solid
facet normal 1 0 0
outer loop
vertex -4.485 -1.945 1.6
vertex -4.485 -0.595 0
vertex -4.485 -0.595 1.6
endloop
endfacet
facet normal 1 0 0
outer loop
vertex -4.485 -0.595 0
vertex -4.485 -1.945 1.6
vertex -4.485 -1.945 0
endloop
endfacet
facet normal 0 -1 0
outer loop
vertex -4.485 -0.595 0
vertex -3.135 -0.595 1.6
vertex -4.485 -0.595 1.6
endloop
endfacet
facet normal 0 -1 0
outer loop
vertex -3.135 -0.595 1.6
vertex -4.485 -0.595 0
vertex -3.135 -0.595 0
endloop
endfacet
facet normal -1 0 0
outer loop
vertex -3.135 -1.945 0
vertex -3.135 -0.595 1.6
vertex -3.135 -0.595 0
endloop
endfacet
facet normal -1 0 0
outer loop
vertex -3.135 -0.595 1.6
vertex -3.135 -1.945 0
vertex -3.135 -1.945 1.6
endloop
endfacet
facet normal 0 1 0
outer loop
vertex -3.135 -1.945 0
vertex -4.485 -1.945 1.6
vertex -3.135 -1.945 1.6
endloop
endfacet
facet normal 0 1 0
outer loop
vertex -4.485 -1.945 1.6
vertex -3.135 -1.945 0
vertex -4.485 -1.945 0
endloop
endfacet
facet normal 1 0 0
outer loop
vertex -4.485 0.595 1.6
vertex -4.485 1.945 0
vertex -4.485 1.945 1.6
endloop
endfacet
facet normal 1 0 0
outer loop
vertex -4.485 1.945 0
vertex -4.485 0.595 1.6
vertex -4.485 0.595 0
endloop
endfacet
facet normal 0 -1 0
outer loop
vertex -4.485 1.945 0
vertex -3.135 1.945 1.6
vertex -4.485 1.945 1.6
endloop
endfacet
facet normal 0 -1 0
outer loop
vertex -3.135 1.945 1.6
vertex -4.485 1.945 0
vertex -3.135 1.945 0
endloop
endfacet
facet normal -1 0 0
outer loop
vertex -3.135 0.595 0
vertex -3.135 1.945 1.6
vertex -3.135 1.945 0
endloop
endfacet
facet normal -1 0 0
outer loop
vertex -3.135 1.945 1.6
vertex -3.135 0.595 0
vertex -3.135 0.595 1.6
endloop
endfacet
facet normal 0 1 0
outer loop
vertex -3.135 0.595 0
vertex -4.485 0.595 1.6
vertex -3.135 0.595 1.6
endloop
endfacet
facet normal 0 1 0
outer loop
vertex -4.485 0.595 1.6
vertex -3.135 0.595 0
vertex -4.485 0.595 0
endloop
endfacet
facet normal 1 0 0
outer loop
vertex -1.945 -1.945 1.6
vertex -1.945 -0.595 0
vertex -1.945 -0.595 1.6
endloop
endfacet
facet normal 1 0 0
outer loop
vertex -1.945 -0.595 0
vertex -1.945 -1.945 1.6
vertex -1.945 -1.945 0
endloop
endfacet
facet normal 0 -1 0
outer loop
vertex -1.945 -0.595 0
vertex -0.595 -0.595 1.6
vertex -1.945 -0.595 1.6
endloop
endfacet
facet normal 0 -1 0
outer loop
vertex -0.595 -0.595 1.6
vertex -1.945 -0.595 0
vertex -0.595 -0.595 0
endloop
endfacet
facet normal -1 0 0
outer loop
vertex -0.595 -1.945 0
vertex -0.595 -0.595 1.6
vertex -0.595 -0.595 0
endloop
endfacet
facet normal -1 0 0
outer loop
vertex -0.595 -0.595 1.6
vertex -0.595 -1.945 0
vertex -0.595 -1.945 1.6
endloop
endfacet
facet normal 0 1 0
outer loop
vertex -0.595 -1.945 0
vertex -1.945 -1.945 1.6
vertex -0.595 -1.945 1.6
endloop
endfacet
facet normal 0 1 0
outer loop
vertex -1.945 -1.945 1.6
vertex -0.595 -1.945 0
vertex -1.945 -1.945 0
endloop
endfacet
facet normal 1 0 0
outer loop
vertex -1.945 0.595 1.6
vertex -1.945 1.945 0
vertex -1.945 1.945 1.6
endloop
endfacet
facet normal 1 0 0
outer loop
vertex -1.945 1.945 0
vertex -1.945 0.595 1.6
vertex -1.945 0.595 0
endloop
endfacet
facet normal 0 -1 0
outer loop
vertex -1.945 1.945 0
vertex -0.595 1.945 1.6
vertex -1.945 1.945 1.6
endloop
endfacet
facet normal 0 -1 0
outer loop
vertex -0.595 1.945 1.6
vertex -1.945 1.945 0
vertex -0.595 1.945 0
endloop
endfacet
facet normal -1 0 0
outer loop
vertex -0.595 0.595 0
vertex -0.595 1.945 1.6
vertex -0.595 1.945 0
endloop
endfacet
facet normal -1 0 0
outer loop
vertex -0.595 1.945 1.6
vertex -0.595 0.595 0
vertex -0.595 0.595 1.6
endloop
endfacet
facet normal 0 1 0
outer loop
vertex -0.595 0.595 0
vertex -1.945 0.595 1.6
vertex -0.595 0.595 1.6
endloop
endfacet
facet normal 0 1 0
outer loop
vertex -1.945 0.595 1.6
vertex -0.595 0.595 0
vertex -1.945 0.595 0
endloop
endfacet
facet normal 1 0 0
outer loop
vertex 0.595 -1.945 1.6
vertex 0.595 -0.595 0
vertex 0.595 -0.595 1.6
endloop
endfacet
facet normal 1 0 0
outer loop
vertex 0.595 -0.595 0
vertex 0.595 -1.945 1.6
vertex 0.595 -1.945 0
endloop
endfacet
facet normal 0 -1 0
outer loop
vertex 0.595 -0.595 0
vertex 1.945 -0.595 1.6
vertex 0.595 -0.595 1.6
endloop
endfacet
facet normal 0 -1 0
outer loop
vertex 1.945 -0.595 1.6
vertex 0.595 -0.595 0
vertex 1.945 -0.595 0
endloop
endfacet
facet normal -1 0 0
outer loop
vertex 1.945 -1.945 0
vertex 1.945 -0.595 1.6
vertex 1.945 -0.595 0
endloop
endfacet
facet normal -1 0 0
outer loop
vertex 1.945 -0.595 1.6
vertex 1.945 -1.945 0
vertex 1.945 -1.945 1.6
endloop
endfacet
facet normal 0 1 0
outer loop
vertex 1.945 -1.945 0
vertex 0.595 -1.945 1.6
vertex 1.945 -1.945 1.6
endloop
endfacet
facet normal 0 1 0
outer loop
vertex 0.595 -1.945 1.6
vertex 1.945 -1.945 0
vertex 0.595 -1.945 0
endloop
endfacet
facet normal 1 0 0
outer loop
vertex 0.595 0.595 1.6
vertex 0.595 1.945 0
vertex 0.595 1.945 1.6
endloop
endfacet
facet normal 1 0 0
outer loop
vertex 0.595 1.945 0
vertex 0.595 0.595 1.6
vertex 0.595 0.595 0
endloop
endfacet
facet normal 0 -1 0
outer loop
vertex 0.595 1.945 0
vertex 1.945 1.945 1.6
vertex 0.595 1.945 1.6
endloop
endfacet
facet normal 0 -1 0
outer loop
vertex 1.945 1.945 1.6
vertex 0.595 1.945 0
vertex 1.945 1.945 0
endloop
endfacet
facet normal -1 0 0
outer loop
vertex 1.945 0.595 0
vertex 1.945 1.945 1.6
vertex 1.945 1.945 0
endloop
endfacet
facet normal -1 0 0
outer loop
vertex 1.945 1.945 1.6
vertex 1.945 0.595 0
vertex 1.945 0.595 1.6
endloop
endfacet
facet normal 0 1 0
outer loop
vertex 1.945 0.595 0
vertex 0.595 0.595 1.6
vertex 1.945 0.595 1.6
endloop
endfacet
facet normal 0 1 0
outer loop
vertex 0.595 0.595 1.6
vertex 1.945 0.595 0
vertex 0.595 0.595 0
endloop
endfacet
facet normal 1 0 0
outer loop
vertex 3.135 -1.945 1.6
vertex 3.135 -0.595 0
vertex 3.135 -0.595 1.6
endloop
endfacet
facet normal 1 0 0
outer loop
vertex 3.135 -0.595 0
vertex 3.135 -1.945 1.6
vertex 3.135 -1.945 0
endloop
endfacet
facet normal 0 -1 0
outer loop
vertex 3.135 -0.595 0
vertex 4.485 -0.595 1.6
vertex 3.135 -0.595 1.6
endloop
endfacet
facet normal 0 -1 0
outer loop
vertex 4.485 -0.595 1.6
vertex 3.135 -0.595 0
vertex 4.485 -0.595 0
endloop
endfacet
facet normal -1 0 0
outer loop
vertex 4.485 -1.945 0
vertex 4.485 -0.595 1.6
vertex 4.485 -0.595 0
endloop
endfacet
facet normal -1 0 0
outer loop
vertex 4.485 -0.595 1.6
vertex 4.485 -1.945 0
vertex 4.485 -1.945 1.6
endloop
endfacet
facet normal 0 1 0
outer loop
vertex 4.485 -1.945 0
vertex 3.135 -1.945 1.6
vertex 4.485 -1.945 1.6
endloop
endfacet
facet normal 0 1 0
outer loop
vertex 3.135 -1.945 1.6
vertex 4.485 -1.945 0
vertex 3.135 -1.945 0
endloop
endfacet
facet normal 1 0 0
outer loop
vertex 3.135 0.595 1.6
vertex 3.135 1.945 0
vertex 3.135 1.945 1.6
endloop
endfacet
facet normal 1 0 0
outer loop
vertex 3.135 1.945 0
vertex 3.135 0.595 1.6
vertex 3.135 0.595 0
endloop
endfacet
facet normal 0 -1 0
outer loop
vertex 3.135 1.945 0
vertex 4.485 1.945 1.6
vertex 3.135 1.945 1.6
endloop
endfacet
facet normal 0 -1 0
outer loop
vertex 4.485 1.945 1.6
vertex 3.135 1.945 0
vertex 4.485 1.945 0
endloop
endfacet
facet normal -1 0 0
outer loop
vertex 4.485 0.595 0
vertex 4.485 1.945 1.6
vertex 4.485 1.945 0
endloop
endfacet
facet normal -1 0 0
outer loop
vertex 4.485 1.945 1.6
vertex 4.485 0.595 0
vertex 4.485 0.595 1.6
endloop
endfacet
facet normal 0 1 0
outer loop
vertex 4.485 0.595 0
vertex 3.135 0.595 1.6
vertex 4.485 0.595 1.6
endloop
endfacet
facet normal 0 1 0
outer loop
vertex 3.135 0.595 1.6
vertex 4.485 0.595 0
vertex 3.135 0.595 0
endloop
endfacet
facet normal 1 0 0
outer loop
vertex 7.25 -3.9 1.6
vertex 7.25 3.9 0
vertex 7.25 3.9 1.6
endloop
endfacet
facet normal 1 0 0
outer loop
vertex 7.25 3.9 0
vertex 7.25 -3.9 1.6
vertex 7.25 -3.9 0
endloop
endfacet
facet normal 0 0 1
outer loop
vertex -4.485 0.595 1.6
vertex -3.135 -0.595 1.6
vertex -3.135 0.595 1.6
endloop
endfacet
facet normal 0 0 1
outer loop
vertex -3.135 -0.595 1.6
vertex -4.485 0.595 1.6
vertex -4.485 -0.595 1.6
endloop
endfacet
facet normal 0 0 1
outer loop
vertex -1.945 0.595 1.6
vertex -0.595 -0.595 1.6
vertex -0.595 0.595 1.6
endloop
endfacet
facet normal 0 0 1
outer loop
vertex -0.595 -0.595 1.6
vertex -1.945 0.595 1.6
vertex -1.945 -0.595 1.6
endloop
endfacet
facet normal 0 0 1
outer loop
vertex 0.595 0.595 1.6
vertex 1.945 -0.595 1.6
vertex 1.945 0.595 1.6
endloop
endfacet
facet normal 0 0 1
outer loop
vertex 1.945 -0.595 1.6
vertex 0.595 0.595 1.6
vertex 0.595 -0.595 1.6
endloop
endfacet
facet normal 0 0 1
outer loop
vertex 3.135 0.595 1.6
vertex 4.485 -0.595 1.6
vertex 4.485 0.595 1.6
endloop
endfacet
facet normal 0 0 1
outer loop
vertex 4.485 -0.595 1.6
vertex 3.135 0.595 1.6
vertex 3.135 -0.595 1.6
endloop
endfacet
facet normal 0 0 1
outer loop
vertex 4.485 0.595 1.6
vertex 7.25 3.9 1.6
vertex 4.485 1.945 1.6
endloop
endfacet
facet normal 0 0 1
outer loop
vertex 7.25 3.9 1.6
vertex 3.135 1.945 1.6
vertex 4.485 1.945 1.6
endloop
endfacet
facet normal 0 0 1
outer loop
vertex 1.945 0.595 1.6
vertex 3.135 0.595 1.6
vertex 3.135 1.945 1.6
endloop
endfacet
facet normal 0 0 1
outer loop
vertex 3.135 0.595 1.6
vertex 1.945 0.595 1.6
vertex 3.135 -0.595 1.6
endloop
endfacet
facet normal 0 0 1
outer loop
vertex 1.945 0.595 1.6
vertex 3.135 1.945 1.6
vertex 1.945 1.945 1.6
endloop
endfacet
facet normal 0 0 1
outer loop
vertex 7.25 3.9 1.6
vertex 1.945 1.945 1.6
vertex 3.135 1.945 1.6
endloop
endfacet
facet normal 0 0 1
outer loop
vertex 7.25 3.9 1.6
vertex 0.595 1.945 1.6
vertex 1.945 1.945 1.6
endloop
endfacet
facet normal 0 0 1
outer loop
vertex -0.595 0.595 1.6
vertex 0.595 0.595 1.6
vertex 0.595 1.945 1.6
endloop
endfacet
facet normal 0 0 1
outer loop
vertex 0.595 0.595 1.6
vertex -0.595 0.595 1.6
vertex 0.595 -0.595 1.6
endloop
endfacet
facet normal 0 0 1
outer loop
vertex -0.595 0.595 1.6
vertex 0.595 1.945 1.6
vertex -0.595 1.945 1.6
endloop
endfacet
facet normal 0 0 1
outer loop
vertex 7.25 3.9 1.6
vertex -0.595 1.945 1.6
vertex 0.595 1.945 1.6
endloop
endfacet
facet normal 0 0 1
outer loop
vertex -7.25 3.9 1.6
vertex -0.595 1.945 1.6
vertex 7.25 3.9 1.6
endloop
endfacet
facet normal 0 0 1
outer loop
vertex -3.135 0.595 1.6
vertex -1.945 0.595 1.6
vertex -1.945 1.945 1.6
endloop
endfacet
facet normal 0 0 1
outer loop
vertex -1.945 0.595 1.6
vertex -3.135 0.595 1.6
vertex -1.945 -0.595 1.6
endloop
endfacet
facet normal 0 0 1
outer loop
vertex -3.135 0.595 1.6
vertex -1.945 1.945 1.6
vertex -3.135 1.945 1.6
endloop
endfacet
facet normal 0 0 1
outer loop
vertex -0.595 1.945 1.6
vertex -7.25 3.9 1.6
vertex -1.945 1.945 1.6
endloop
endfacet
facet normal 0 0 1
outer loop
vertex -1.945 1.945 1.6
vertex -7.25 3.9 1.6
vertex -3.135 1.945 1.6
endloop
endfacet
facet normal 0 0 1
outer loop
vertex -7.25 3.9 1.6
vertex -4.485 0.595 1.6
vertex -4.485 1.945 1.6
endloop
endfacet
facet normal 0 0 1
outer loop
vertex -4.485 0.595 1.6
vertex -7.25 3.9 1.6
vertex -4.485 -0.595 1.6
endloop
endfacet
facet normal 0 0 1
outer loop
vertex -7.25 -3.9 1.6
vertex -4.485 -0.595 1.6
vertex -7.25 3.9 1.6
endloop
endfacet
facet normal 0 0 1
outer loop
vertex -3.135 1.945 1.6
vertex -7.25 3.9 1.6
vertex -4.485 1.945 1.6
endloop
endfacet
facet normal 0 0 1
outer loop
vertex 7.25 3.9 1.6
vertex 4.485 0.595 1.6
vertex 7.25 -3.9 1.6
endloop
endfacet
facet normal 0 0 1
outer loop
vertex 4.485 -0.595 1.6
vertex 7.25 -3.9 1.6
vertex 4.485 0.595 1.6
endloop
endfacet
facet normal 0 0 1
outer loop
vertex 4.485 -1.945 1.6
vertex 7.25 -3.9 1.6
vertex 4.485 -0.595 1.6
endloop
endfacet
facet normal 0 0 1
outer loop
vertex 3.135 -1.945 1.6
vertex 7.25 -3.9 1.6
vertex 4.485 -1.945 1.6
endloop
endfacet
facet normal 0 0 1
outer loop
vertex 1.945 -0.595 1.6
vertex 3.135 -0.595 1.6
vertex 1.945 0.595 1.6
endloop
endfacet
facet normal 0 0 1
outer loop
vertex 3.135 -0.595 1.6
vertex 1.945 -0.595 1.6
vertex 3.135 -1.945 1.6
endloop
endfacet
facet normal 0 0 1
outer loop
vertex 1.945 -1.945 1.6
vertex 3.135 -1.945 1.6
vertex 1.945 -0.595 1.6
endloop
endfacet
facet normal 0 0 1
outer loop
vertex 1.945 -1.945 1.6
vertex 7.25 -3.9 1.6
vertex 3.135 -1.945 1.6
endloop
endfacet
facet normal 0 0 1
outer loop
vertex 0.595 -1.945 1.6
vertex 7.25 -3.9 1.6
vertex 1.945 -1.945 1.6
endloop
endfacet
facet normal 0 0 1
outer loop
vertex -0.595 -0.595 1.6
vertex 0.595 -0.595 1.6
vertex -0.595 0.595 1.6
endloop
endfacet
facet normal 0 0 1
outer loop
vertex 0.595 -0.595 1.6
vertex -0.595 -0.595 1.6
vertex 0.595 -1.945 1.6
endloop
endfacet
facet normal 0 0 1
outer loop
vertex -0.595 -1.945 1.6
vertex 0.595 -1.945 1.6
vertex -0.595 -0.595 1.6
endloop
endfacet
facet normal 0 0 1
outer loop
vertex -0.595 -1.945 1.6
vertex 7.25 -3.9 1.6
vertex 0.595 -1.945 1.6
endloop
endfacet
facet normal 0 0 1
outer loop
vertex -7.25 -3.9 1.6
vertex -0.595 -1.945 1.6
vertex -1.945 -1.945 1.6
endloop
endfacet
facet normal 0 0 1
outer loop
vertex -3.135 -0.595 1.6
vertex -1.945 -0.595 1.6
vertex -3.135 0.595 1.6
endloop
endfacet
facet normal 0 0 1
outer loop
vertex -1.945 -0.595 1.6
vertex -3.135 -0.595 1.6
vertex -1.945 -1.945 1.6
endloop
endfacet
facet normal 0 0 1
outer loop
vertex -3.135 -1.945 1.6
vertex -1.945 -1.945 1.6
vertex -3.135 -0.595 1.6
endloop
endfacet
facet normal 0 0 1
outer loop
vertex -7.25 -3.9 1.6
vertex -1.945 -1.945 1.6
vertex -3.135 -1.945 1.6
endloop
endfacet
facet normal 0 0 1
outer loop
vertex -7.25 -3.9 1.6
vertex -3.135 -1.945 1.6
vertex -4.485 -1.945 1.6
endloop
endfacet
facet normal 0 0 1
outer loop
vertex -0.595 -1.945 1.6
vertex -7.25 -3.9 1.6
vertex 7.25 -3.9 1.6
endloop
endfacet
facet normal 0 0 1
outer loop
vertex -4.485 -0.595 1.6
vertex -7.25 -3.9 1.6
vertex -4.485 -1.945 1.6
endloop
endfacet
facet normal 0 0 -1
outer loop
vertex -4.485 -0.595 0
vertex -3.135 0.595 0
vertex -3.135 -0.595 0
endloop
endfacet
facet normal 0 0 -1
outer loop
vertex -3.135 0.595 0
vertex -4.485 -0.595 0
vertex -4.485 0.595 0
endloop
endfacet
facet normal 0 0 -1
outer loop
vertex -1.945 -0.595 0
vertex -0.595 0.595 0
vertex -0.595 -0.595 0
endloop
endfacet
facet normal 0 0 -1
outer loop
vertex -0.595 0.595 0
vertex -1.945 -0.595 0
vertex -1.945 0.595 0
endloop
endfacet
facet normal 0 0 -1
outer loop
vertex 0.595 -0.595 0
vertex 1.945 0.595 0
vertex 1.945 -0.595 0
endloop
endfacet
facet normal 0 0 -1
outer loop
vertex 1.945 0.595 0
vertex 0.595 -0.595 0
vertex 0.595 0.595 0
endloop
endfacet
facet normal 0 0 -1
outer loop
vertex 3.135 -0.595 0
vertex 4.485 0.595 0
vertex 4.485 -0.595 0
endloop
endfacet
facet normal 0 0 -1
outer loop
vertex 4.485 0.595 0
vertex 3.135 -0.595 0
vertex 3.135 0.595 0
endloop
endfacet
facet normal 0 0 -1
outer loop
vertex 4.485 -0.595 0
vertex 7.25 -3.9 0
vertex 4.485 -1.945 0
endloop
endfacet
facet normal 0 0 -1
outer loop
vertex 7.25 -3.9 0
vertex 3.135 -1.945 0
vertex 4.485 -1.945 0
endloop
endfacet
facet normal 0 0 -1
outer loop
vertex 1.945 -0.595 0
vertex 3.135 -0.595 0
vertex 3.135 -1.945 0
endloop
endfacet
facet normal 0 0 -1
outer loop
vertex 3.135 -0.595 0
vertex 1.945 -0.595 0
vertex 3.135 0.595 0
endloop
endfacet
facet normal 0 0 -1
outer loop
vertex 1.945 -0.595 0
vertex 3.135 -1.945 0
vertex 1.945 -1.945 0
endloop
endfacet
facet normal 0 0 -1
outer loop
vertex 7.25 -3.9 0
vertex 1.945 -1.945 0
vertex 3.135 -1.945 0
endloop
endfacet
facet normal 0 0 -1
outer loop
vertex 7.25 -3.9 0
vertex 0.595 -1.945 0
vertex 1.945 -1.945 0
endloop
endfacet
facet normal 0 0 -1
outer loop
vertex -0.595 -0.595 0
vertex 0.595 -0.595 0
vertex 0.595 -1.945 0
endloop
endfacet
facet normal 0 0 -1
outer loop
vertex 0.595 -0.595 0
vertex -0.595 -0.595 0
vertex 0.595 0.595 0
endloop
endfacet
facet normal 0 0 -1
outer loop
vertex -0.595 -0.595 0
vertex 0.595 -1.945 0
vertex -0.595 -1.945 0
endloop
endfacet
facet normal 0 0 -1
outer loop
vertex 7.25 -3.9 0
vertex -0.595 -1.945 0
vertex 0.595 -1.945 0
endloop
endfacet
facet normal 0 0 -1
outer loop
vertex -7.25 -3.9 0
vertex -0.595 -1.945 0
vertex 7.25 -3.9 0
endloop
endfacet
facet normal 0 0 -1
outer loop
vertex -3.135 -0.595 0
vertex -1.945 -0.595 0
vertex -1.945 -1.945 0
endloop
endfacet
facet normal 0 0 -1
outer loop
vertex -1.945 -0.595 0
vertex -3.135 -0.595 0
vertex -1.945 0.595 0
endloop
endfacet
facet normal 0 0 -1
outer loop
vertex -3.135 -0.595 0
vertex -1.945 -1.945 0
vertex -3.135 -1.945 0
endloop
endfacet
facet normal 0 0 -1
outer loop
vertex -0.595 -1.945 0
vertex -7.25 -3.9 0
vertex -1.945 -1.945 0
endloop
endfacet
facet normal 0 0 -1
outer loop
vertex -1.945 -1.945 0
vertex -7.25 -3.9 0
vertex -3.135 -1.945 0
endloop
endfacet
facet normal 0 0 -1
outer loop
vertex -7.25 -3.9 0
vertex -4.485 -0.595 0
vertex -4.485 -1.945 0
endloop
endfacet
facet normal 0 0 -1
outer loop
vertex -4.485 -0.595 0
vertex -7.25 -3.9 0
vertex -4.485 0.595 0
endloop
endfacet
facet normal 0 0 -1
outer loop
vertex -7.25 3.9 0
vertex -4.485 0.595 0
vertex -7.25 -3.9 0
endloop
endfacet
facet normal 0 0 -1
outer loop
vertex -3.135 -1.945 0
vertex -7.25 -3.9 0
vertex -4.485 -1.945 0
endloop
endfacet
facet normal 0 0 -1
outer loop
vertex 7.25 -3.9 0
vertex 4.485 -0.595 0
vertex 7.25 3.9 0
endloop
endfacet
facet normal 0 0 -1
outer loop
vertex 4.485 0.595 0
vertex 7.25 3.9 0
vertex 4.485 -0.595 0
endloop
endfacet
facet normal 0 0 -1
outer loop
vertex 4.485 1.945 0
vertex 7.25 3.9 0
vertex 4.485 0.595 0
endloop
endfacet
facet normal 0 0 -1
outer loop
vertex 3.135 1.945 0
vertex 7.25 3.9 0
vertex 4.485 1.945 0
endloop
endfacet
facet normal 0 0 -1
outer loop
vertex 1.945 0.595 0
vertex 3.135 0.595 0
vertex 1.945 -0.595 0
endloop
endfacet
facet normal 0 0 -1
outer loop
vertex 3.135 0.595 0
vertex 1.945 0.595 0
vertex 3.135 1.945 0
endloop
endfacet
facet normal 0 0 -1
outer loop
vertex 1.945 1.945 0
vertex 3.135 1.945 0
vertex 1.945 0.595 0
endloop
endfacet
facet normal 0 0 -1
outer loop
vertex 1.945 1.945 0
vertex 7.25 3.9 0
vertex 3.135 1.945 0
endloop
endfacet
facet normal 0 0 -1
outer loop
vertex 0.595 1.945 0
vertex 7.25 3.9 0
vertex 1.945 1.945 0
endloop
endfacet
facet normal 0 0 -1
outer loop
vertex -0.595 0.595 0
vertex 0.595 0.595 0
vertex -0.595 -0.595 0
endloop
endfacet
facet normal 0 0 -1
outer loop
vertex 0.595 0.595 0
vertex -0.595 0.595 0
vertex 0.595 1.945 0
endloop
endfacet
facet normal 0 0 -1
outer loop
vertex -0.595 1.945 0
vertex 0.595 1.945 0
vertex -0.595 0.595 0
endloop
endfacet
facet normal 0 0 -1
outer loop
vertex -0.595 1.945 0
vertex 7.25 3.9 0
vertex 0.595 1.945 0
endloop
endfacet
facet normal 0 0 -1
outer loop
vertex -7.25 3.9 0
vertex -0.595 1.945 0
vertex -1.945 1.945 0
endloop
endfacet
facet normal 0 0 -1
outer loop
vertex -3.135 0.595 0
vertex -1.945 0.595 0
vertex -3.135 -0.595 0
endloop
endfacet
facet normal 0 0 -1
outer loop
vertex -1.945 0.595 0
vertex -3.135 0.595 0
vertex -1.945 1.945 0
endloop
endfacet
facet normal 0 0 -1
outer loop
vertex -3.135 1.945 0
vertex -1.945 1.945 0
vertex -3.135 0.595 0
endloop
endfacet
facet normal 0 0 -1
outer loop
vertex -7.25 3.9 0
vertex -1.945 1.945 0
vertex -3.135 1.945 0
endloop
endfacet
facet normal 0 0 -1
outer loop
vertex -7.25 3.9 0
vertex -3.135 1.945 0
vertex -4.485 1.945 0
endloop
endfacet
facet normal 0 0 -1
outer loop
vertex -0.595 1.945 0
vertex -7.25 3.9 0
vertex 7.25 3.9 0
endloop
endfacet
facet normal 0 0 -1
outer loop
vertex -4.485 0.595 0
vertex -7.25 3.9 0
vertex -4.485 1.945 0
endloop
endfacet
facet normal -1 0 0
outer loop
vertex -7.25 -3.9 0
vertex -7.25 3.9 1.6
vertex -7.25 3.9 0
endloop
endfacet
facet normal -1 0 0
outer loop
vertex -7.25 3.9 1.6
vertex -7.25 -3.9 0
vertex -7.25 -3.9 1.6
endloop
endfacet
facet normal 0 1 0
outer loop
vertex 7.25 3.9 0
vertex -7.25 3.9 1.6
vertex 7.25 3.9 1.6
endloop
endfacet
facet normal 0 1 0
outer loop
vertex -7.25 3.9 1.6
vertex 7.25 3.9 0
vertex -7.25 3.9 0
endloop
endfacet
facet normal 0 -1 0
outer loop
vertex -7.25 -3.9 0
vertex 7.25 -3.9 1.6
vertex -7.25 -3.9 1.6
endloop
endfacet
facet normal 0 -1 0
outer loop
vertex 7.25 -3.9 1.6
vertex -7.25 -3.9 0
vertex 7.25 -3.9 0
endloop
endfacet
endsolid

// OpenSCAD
// BTS7960 driver-side holder for six *individual* female Dupont jumper ends.
// Two printed dummies occupy R_IS and L_IS. Mechanical fit prototype only.
// Dimensions are millimetres. Actual 1P jumper plastic must be measured.

$fn = 48;

part = "fit_gauge"; // [fit_gauge,lower,upper,dummy,assembly,exploded]
side_relief = 0.0; // v3 test uses 1.0 mm extra outward space per half

pitch = 2.54;
pin_aperture = 1.35;   // carried over from the driver gauge that fitted
front_lip = 1.60;

// Provisional dimensions for one separate 1P female Dupont plastic end.
single_x = 2.54;
single_y = 2.54;
single_z = 14.00;
pack_clearance = 0.40; // total clearance around a packed 2x4 block
pack_clearance_y = pack_clearance + 2*side_relief;

nose_x = 14.50;         // keep the v1 driver-side x envelope
nose_y = 7.80 + 2*side_relief;
rear_stop = 3.00;       // plastic behind the female ends
nose_z = front_lip + single_z + rear_stop;

rear_x = 25.00;
rear_y = 15.00;
rear_z = 18.00;
rear_corner_r = 2.50;
total_z = nose_z + rear_z;

wire_channel_x = 1.50; // provisional; verify against jumper insulation
wire_channel_y = 2.20; // open at the split so cables can be laid in place
rear_chamber_x = 13.00;
rear_chamber_y = 8.00;
rear_chamber_depth = 12.50;
cable_exit_d = 6.00;

screw_x = 9.00;
screw_z = nose_z + 7.00;
screw_clearance_d = 3.20; // M3 bolts and external nuts as in v1
mark_depth = 0.60;

dummy_x = single_x;
dummy_y = single_y;
dummy_z = single_z;
dummy_pin_hole = 1.45;

epsilon = 0.02;

function contact_x(col) = (col - 1.5)*pitch;
function contact_y(row) = (row - 0.5)*pitch;
// Column 1 in each row is the unused current-sense (IS) contact.
function used(col) = col != 1;

assert(4*single_x + pack_clearance < nose_x);
assert(2*single_y + pack_clearance_y < nose_y);

module eight_pin_pattern(h=front_lip) {
    for (col = [0:3], row = [0:1])
        translate([contact_x(col), contact_y(row), -epsilon])
            linear_extrude(height=h+2*epsilon)
                square([pin_aperture, pin_aperture], center=true);
}

module fit_gauge() {
    difference() {
        translate([-nose_x/2, -nose_y/2, 0])
            cube([nose_x, nose_y, front_lip]);
        eight_pin_pattern();
    }
}

module outside_shell() {
    union() {
        translate([-nose_x/2, -nose_y/2, 0])
            cube([nose_x, nose_y, nose_z]);
        hull()
            for (x = [-rear_x/2+rear_corner_r,
                       rear_x/2-rear_corner_r],
                 z = [nose_z+rear_corner_r,
                      total_z-rear_corner_r])
                translate([x, 0, z])
                    rotate([-90, 0, 0])
                        cylinder(r=rear_corner_r, h=rear_y, center=true);
    }
}

module packed_ends_pocket() {
    translate([-(4*single_x+pack_clearance)/2,
               -(2*single_y+pack_clearance_y)/2, front_lip])
        cube([4*single_x+pack_clearance,
              2*single_y+pack_clearance_y, single_z+epsilon]);
}

module wire_channels() {
    // Individual comb slots only behind the six occupied positions. Each
    // channel opens to y=0, allowing preterminated jumper wires to be laid
    // into either clamshell half without passing the male end through a hole.
    for (col = [0:3], row = [0:1]) if (used(col))
        translate([contact_x(col)-wire_channel_x/2,
                   row == 0 ? -wire_channel_y : 0,
                   front_lip+single_z-epsilon])
            cube([wire_channel_x, wire_channel_y,
                  rear_stop+2*epsilon]);
}

module rear_chamber() {
    translate([-rear_chamber_x/2, -rear_chamber_y/2,
               nose_z-epsilon])
        cube([rear_chamber_x, rear_chamber_y,
              rear_chamber_depth+2*epsilon]);
    translate([0, 0, nose_z+rear_chamber_depth-epsilon])
        cylinder(d=cable_exit_d,
                 h=rear_z-rear_chamber_depth+2*epsilon);
}

module fastener_holes() {
    for (x = [-screw_x, screw_x])
        translate([x, -rear_y/2-epsilon, screw_z])
            rotate([-90, 0, 0])
                cylinder(d=screw_clearance_d, h=rear_y+2*epsilon);
}

module orientation_mark() {
    // This is a visual mark only; the bare 2x4 driver header is symmetric.
    translate([0, rear_y/2+epsilon, nose_z+3.10])
        rotate([90, 0, 0])
            linear_extrude(height=mark_depth+2*epsilon)
                mirror([1, 0, 0])
                    text("VCC", size=3.80,
                         halign="center", valign="center");
}

module whole_shell() {
    difference() {
        outside_shell();
        packed_ends_pocket();
        wire_channels();
        rear_chamber();
        eight_pin_pattern();
        fastener_holes();
        orientation_mark();
    }
}

module lower_half() {
    intersection() {
        whole_shell();
        translate([-rear_x, -rear_y, -epsilon])
            cube([2*rear_x, rear_y, total_z+2*epsilon]);
    }
}

module upper_half() {
    intersection() {
        whole_shell();
        translate([-rear_x, 0, -epsilon])
            cube([2*rear_x, rear_y, total_z+2*epsilon]);
    }
}

module unused_is_dummy() {
    difference() {
        translate([-dummy_x/2, -dummy_y/2, 0])
            cube([dummy_x, dummy_y, dummy_z]);
        translate([-dummy_pin_hole/2, -dummy_pin_hole/2, -epsilon])
            cube([dummy_pin_hole, dummy_pin_hole,
                  dummy_z+2*epsilon]);
    }
}

module mockup_ends() {
    for (col = [0:3], row = [0:1])
        translate([contact_x(col), contact_y(row), front_lip])
            if (used(col))
                color([0.12, 0.12, 0.12, 0.6])
                    translate([-single_x/2, -single_y/2, 0])
                        cube([single_x, single_y, single_z]);
            else
                color([0.95, 0.48, 0.18]) unused_is_dummy();
}

if (part == "fit_gauge") fit_gauge();
else if (part == "lower") rotate([-90, 0, 0]) lower_half();
else if (part == "upper") rotate([90, 0, 0]) upper_half();
else if (part == "dummy") unused_is_dummy();
else if (part == "assembly") {
    lower_half();
    color([0.40, 0.75, 0.85, 0.45]) upper_half();
    mockup_ends();
} else if (part == "exploded") {
    color([0.40, 0.75, 0.85]) translate([0, 6, 0]) upper_half();
    color([0.45, 0.70, 0.45]) translate([0, -6, 0]) lower_half();
    mockup_ends();
} else assert(false, str("Unknown part: ", part));
